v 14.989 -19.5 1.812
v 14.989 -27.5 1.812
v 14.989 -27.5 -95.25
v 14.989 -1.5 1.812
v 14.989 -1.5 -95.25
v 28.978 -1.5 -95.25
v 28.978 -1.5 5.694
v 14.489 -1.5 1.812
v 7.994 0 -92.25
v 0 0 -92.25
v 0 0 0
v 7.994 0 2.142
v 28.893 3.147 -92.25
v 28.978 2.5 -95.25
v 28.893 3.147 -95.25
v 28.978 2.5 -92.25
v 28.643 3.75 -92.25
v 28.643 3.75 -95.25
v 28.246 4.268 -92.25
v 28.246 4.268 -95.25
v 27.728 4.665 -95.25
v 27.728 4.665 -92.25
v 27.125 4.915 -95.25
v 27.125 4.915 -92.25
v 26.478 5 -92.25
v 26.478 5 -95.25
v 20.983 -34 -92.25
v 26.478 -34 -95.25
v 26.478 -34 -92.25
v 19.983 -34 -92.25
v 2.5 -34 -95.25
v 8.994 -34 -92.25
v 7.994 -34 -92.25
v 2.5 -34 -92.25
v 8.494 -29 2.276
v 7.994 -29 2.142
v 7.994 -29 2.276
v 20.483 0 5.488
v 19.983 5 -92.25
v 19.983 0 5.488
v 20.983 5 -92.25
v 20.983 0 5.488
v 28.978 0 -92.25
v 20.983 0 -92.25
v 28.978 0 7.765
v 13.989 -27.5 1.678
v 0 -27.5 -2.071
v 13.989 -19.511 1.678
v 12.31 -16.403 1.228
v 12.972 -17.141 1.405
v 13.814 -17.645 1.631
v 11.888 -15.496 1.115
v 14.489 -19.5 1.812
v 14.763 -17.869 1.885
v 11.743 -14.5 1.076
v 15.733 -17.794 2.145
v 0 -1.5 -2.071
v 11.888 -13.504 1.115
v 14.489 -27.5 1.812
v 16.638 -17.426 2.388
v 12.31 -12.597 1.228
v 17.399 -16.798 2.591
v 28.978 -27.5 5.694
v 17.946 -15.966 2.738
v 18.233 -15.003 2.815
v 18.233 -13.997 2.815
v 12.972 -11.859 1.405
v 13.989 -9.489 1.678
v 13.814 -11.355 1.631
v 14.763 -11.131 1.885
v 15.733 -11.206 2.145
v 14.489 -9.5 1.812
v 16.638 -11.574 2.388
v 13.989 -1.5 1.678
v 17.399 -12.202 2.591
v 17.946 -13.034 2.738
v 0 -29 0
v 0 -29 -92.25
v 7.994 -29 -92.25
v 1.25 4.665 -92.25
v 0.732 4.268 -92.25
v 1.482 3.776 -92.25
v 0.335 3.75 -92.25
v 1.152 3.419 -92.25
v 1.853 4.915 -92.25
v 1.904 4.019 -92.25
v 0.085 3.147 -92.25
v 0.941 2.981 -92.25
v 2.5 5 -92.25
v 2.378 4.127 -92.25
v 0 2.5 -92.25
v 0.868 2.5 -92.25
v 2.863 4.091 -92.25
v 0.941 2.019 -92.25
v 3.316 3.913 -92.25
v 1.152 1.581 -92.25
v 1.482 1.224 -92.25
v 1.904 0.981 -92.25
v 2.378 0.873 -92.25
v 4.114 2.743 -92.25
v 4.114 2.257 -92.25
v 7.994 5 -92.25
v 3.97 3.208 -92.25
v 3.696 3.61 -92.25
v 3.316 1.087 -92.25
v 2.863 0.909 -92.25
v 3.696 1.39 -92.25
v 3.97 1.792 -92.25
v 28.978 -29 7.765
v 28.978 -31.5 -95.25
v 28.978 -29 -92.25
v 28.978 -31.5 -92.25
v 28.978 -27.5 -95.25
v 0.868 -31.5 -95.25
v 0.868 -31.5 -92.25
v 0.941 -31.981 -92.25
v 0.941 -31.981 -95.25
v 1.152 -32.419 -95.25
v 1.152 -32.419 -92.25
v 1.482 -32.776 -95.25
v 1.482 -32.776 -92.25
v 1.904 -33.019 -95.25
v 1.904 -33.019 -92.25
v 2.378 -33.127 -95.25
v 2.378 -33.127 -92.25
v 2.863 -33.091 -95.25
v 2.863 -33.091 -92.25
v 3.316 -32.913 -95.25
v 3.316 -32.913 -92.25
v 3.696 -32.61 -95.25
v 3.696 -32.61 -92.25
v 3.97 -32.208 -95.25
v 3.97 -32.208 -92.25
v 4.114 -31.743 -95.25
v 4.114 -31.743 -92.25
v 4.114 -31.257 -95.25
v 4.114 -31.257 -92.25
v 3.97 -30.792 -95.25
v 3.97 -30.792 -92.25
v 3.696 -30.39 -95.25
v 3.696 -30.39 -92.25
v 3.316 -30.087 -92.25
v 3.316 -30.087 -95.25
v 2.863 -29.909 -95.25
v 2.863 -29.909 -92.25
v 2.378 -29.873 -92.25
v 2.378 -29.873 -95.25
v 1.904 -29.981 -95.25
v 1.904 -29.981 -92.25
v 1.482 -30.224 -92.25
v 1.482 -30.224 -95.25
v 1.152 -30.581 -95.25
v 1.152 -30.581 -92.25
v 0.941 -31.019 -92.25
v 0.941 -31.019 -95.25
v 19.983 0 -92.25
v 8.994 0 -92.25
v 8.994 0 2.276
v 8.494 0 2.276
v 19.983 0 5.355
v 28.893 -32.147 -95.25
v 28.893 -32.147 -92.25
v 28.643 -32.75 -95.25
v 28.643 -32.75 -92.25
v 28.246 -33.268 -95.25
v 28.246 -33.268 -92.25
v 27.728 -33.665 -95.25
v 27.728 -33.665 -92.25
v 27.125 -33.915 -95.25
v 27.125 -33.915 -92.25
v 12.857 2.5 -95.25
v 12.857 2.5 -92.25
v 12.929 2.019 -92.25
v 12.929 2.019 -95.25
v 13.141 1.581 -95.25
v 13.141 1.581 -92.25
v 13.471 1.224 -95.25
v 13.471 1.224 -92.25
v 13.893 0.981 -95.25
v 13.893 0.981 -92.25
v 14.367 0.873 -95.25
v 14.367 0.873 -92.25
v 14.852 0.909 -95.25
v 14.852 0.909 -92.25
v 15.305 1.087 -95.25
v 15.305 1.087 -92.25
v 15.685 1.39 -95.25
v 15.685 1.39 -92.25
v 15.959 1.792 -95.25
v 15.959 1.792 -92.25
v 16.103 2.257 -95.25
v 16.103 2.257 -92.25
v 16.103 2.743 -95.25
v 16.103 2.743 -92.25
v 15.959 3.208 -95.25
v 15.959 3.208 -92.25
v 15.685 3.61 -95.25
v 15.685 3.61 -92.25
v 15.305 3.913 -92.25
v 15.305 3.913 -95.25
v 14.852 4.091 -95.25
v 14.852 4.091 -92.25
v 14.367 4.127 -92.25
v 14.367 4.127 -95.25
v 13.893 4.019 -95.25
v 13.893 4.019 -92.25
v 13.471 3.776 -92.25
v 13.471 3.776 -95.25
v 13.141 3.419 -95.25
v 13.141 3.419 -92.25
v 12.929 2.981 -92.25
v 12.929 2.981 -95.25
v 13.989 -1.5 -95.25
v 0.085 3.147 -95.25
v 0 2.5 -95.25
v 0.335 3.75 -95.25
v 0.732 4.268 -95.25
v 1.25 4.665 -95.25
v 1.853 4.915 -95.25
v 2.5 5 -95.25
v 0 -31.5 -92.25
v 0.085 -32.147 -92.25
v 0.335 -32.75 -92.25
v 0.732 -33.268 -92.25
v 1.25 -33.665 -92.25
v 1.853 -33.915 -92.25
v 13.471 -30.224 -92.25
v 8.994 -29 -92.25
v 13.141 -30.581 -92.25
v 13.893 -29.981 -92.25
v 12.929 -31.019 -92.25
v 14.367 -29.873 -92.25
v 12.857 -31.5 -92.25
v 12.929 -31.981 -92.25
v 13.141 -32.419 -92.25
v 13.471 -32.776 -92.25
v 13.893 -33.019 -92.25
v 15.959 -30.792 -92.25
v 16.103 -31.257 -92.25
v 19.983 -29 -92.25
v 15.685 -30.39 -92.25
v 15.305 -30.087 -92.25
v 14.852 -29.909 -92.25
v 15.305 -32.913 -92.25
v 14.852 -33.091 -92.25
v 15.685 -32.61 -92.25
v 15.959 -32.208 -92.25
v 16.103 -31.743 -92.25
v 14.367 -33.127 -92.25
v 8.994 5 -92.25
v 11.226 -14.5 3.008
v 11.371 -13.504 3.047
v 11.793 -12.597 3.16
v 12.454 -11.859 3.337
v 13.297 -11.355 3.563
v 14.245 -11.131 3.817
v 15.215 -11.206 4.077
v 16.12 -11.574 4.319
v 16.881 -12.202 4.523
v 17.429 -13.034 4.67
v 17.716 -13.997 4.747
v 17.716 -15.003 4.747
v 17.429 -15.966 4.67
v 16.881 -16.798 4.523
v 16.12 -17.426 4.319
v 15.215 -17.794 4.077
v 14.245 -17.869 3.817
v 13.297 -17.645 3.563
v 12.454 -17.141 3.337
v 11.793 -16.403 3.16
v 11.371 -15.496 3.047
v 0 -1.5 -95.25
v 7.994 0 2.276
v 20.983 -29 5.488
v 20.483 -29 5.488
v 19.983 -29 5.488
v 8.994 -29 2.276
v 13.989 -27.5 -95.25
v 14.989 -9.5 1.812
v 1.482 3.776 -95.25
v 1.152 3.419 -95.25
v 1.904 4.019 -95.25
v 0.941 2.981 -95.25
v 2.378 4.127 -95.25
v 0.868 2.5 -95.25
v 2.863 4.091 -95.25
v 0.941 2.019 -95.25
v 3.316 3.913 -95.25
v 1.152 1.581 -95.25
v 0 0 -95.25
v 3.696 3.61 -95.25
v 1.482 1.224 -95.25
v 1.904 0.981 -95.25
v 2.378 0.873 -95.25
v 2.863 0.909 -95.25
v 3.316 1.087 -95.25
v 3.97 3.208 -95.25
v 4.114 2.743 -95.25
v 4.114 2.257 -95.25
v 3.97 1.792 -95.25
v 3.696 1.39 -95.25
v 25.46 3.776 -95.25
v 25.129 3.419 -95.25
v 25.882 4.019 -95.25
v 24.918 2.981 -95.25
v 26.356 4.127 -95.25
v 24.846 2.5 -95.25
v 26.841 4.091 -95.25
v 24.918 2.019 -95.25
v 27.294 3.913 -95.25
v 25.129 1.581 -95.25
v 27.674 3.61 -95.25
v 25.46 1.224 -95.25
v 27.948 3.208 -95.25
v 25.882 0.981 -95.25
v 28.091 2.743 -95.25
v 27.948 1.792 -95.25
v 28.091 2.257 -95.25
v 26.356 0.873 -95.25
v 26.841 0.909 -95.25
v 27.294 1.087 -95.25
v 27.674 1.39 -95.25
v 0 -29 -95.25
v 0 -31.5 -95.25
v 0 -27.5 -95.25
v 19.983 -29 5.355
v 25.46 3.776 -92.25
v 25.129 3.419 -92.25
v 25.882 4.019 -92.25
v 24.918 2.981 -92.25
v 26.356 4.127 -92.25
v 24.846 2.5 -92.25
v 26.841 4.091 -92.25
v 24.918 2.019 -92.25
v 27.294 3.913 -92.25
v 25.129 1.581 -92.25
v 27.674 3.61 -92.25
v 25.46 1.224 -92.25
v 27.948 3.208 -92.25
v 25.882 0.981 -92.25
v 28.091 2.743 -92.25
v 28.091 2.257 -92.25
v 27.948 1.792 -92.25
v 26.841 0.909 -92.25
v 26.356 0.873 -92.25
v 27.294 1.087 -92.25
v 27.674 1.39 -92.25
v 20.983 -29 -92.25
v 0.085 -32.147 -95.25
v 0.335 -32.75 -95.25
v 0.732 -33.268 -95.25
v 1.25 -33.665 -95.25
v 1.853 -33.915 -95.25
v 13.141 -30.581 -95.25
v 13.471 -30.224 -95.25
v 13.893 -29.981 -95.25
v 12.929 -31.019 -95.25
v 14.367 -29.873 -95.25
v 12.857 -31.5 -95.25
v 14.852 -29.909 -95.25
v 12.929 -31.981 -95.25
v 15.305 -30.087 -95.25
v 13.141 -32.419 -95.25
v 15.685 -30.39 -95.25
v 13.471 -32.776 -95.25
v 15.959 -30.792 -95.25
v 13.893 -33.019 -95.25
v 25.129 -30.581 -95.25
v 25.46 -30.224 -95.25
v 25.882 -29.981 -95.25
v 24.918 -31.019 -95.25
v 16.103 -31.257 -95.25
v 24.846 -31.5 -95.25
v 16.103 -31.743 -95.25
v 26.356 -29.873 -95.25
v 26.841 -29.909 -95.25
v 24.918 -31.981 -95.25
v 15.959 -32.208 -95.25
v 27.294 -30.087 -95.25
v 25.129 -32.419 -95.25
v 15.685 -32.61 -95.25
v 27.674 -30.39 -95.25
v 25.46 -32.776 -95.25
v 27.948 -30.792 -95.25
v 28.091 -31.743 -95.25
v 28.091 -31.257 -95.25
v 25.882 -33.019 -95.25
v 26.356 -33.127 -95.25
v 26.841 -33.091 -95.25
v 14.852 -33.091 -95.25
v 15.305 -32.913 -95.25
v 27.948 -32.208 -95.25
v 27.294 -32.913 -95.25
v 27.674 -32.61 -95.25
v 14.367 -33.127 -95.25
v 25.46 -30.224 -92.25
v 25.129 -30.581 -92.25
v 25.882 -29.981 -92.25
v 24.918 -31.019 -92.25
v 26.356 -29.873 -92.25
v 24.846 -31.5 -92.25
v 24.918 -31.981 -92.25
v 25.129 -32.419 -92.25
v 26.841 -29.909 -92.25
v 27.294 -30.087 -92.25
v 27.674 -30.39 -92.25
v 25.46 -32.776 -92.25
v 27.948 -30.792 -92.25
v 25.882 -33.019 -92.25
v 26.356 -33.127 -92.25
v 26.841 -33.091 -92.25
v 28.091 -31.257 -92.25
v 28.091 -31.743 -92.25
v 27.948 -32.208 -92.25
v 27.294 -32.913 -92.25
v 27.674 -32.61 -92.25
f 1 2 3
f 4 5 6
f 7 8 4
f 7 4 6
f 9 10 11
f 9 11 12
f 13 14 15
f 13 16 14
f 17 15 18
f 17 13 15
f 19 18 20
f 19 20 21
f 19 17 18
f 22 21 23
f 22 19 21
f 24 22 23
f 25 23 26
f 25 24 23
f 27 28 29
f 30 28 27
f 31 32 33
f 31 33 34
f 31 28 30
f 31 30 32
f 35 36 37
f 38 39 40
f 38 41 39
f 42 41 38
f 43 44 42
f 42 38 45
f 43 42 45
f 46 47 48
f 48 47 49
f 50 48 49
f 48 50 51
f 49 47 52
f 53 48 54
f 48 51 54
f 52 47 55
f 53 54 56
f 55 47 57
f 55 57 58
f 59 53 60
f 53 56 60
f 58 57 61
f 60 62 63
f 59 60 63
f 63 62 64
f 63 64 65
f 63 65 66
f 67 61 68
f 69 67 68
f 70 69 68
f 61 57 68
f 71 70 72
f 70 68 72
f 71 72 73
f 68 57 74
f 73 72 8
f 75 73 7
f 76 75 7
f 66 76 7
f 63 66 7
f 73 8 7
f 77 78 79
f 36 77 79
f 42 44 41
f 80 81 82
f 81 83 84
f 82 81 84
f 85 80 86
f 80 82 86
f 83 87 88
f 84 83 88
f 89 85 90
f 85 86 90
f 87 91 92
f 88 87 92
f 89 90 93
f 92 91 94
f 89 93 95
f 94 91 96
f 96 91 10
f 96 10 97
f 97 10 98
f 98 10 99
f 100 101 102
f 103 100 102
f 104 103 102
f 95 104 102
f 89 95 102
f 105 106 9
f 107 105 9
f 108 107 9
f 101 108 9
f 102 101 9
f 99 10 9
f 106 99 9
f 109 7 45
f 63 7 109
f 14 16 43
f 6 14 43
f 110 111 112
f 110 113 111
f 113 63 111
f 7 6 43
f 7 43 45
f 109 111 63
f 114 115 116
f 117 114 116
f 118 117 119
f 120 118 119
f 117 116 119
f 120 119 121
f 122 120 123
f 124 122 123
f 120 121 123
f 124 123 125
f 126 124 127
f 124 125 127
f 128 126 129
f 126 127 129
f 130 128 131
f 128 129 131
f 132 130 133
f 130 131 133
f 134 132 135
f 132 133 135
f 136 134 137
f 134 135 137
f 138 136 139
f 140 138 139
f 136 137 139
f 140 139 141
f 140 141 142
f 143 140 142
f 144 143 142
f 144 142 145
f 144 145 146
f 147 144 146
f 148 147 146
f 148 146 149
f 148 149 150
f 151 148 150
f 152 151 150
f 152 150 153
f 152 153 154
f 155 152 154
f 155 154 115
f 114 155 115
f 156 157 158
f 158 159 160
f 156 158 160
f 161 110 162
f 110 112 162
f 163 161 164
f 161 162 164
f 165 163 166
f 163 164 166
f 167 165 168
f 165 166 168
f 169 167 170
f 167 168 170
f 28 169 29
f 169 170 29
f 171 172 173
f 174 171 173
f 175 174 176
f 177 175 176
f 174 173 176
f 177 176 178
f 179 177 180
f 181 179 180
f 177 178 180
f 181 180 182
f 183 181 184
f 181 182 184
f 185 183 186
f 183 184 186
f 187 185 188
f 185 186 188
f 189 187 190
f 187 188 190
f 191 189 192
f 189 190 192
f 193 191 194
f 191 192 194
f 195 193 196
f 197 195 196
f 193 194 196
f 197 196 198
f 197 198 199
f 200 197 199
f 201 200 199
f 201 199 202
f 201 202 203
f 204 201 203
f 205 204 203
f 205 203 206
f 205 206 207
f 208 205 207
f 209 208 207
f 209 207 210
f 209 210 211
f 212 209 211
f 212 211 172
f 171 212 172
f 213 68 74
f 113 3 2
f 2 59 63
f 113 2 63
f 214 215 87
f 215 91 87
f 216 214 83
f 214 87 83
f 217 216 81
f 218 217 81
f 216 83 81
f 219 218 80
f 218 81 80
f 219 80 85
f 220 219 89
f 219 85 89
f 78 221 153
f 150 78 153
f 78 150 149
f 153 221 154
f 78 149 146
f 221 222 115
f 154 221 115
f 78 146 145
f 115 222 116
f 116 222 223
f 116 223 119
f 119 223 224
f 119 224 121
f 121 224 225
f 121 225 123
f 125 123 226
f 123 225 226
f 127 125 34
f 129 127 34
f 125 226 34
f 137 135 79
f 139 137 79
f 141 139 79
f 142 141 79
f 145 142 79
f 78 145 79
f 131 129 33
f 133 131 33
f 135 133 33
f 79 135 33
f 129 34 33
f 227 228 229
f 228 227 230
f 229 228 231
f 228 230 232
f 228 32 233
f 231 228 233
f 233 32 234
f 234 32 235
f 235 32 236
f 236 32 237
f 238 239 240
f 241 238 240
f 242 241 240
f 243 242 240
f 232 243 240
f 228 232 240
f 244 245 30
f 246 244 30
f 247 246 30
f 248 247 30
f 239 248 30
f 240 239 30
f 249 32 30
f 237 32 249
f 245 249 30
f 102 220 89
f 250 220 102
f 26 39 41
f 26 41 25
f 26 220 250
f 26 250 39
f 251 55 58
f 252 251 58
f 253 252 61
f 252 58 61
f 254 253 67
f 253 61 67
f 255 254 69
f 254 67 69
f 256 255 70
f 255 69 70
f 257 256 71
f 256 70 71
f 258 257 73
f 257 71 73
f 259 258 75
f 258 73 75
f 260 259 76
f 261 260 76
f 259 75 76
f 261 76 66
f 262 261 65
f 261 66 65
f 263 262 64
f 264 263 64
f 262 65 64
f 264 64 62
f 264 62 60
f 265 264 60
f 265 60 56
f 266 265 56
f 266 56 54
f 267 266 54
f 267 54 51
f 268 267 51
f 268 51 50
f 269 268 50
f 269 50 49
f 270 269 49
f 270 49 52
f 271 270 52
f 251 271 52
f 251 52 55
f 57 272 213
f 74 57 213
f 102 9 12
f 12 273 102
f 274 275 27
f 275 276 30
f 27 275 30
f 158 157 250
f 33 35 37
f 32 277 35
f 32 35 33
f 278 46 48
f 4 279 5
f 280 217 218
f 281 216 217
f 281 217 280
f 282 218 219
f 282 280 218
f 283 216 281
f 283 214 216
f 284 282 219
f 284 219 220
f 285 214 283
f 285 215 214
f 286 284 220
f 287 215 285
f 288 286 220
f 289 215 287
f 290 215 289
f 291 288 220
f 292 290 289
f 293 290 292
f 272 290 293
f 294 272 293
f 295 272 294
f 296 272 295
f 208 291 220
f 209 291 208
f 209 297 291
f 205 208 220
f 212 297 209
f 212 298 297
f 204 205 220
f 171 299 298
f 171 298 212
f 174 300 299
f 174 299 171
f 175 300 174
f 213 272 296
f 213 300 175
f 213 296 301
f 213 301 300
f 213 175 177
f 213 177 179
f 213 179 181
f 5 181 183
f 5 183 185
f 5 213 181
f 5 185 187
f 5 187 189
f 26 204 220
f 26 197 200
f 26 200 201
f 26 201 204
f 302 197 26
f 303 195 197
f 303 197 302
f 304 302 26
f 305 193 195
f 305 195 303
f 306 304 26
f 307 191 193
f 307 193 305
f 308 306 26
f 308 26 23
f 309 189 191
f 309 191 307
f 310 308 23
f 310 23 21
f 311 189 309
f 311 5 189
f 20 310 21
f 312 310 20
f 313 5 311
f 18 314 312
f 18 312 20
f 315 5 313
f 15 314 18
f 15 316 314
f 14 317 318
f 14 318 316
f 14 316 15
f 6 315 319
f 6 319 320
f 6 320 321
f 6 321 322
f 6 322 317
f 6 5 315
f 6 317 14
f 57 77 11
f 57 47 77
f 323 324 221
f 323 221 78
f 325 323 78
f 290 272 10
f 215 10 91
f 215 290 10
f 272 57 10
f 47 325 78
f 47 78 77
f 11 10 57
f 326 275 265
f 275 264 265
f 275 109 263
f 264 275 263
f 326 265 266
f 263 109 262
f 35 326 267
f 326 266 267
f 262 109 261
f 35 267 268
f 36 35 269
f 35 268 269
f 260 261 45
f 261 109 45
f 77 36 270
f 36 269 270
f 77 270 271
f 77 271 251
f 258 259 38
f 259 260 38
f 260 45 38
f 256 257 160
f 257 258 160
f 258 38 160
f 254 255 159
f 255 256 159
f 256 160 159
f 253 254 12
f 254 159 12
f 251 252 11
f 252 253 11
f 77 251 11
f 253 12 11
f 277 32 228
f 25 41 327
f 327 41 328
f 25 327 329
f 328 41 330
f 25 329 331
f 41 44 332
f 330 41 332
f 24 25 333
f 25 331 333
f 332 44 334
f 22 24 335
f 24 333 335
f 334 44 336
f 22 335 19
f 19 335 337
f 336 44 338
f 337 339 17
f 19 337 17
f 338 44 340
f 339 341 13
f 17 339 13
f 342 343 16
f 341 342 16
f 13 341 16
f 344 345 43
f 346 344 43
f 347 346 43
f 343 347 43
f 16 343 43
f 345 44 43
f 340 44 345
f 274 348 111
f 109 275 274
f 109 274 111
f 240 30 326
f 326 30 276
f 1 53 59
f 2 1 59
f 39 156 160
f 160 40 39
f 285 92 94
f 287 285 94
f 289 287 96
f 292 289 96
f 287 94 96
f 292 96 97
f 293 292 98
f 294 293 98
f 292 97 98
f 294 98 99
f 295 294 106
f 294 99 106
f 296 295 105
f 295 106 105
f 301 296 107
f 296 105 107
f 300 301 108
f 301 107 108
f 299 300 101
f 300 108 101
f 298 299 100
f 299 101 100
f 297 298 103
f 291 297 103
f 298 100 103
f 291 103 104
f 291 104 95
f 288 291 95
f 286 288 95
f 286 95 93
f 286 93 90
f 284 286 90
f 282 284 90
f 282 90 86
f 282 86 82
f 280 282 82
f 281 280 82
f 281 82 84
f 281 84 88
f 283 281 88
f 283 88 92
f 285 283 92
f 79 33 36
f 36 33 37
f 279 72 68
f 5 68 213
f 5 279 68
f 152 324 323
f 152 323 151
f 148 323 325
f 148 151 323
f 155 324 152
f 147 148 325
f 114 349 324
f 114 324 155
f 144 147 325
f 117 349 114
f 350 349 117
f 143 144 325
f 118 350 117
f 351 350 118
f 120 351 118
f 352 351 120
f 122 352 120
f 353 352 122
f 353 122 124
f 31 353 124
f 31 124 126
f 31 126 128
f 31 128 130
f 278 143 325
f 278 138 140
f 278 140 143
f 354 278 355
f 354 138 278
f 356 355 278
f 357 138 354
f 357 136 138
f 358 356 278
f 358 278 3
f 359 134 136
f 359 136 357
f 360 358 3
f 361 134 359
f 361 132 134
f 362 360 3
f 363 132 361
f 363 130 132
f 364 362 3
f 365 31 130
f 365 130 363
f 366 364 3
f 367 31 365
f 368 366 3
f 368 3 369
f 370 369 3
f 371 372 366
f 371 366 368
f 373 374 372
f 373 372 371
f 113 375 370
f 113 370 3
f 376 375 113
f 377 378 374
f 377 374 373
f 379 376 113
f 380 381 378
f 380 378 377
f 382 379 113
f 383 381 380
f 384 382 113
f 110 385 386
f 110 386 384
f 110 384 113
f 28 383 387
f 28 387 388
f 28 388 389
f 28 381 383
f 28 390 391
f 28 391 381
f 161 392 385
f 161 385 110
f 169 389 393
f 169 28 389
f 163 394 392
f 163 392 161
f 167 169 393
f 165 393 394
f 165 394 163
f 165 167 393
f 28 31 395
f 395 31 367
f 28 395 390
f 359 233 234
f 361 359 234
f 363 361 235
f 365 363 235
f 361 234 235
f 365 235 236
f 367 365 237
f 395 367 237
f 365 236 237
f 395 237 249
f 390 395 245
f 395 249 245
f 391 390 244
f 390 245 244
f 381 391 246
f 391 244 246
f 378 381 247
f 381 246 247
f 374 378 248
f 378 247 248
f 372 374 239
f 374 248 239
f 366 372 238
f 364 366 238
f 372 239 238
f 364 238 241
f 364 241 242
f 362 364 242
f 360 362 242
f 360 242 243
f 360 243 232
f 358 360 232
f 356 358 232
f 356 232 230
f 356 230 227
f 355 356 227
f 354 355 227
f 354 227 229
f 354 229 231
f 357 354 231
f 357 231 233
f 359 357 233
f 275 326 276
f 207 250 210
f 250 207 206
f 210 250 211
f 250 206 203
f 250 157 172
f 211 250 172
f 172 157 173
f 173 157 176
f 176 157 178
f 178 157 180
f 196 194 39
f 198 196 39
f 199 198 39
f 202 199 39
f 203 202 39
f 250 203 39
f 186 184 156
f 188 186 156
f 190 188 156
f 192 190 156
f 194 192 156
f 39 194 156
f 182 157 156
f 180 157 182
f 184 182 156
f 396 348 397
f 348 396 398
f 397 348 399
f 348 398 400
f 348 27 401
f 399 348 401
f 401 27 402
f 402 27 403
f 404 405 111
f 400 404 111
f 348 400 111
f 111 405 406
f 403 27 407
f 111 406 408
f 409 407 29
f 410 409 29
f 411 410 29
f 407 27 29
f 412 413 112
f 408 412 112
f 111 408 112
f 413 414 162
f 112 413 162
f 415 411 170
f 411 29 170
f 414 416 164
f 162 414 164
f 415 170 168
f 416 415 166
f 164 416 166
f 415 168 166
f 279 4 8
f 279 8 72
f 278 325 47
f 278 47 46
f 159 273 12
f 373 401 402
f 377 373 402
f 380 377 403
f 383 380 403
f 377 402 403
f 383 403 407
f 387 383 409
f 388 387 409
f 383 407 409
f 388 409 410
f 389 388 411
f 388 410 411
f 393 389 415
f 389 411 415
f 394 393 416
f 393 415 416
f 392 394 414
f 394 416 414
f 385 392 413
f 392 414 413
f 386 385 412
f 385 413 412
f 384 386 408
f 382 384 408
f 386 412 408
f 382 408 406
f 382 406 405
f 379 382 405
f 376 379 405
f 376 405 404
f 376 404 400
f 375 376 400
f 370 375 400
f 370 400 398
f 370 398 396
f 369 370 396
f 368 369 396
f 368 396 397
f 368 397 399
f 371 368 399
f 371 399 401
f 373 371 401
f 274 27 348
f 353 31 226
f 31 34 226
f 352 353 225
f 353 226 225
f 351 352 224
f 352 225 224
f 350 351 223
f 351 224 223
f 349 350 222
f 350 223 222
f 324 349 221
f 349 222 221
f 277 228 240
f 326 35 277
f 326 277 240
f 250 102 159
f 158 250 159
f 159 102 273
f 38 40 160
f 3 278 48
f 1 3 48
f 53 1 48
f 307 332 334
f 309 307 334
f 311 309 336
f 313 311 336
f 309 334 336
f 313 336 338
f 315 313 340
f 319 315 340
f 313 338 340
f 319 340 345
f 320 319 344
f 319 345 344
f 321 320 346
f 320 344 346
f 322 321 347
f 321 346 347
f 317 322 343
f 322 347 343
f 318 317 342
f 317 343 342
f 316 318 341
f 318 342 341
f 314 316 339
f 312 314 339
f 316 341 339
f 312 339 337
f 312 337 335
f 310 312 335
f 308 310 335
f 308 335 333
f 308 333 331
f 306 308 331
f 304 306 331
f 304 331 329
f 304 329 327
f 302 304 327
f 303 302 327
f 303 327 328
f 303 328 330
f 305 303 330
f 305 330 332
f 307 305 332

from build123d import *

# Parameters (mm, degrees)
F1_DEPTH  = 29
F0_W      = 28.9777747887
F0_H      = 95.25
F2_DEPTH  = 29
F5_DEPTH  = 3
F6_R      = 2.5
F7_D      = 3.2639
F10_R     = 2.5
F9_W      = 60
F9_H      = 26
F11_DEPTH = 97.505434954
F16_DEPTH = 0.5
F19_DEPTH = 0.5
F22_DEPTH = 0.5
F23_D     = 6.7564


# Not quite as in the source:
# - a feature names something its author has since deleted; it is built from what else it names


with BuildPart() as f1:
    # F0 (on Front) → F1 (new body)
    with BuildSketch(Plane.XZ):
        Polygon((28.9777747887, 7.7645713531), (0, 0), (28.9777747887, 0), align=None)
    extrude(amount=F1_DEPTH)

    # F0 (on Front) → F2 (join)
    with BuildSketch(Plane.XZ):
        Polygon((28.9777747887, 7.7645713531), (0, 0), (28.9777747887, 0), align=None)
        with Locations((14.4888873943, -47.625)):
            Rectangle(F0_W, F0_H)
    extrude(amount=F2_DEPTH)

    # F4 (on face) → F5 (join)
    with BuildSketch(Plane(origin=(0, 0, -95.25), x_dir=(1, 0, 0), z_dir=(0, 0, -1))):
        Polygon((0, 29), (14.4888873943, 29), (28.9777747887, 29), (28.9777747887, 34), (0, 34), align=None)
        Polygon((28.9777747887, 0), (14.4888873943, 0), (0, 0), (0, -5), (28.9777747887, -5), align=None)
    extrude(amount=-F5_DEPTH)

    # F6
    f6_edges = [f1.edges().sort_by_distance(p)[0] for p in [
        (28.977775, -34, -93.75),
        (0, -34, -93.75),
    ]]
    fillet(f6_edges, radius=F6_R)

    # F7 (through all)
    with Locations(Plane(origin=(0, 0, -95.25), x_dir=(1, 0, 0), z_dir=(0, 0, -1))):
        with Locations((2.5, 31.5), (14.4888873943, 31.5), (26.4777747887, 31.5), (2.5, -2.5), (14.4888873943, -2.5), (26.4777747887, -2.5)):
            Hole(F7_D / 2)

    # F10
    f10_edges = [f1.edges().sort_by_distance(p)[0] for p in [
        (28.977775, 5, -93.75),
        (0, 5, -93.75),
    ]]
    fillet(f10_edges, radius=F10_R)

    # F9 (on offset) → F11 (cut, through all)
    with BuildSketch(Plane(origin=(0.5176380902, 0, -1.9318516526), x_dir=(0.9659258263, 0, 0.2588190451), z_dir=(-0.2588190451, 0, 0.9659258263))):
        with Locations((-0.5358983849, -14.5)):
            Rectangle(F9_W, F9_H)
    extrude(amount=-F11_DEPTH, mode=Mode.SUBTRACT)

    # F15 (on plane+point) → F16 (join, symmetric)
    with BuildSketch(Plane.YZ.offset(20.4833310915)):
        Polygon((-29, -92.25), (-29, 5.4884920243), (-34, -92.25), align=None)
        Polygon((5, -92.25), (0, 5.4884920243), (0, -92.25), align=None)
    extrude(amount=F16_DEPTH, both=True)

    # F18 (on plane+point) → F19 (join, symmetric)
    with BuildSketch(Plane.YZ.offset(8.4944436972)):
        Polygon((5, -92.25), (0, 2.2760793288), (0, -92.25), align=None)
        Polygon((-34, -92.25), (-29, -92.25), (-29, 2.2760793288), align=None)
    extrude(amount=F19_DEPTH, both=True)

    # F21 (on plane+point) → F22 (join, symmetric)
    with BuildSketch(Plane.YZ.offset(14.4888873943)):
        Polygon((-27.5, 1.8117333157), (-27.5, -95.25), (-19.5, 1.8117333157), align=None)
        Polygon((-1.5, 1.8117333157), (-9.5, 1.8117333157), (-1.5, -95.25), align=None)
    extrude(amount=F22_DEPTH, both=True)

    # F23 (through all)
    with Locations(Plane(origin=(0, 0, 0), x_dir=(0.9659258263, 0, 0.2588190451), z_dir=(-0.2588190451, 0, 0.9659258263))):
        with Locations((15, -14.5)):
            Hole(F23_D / 2)


solid = f1.part
